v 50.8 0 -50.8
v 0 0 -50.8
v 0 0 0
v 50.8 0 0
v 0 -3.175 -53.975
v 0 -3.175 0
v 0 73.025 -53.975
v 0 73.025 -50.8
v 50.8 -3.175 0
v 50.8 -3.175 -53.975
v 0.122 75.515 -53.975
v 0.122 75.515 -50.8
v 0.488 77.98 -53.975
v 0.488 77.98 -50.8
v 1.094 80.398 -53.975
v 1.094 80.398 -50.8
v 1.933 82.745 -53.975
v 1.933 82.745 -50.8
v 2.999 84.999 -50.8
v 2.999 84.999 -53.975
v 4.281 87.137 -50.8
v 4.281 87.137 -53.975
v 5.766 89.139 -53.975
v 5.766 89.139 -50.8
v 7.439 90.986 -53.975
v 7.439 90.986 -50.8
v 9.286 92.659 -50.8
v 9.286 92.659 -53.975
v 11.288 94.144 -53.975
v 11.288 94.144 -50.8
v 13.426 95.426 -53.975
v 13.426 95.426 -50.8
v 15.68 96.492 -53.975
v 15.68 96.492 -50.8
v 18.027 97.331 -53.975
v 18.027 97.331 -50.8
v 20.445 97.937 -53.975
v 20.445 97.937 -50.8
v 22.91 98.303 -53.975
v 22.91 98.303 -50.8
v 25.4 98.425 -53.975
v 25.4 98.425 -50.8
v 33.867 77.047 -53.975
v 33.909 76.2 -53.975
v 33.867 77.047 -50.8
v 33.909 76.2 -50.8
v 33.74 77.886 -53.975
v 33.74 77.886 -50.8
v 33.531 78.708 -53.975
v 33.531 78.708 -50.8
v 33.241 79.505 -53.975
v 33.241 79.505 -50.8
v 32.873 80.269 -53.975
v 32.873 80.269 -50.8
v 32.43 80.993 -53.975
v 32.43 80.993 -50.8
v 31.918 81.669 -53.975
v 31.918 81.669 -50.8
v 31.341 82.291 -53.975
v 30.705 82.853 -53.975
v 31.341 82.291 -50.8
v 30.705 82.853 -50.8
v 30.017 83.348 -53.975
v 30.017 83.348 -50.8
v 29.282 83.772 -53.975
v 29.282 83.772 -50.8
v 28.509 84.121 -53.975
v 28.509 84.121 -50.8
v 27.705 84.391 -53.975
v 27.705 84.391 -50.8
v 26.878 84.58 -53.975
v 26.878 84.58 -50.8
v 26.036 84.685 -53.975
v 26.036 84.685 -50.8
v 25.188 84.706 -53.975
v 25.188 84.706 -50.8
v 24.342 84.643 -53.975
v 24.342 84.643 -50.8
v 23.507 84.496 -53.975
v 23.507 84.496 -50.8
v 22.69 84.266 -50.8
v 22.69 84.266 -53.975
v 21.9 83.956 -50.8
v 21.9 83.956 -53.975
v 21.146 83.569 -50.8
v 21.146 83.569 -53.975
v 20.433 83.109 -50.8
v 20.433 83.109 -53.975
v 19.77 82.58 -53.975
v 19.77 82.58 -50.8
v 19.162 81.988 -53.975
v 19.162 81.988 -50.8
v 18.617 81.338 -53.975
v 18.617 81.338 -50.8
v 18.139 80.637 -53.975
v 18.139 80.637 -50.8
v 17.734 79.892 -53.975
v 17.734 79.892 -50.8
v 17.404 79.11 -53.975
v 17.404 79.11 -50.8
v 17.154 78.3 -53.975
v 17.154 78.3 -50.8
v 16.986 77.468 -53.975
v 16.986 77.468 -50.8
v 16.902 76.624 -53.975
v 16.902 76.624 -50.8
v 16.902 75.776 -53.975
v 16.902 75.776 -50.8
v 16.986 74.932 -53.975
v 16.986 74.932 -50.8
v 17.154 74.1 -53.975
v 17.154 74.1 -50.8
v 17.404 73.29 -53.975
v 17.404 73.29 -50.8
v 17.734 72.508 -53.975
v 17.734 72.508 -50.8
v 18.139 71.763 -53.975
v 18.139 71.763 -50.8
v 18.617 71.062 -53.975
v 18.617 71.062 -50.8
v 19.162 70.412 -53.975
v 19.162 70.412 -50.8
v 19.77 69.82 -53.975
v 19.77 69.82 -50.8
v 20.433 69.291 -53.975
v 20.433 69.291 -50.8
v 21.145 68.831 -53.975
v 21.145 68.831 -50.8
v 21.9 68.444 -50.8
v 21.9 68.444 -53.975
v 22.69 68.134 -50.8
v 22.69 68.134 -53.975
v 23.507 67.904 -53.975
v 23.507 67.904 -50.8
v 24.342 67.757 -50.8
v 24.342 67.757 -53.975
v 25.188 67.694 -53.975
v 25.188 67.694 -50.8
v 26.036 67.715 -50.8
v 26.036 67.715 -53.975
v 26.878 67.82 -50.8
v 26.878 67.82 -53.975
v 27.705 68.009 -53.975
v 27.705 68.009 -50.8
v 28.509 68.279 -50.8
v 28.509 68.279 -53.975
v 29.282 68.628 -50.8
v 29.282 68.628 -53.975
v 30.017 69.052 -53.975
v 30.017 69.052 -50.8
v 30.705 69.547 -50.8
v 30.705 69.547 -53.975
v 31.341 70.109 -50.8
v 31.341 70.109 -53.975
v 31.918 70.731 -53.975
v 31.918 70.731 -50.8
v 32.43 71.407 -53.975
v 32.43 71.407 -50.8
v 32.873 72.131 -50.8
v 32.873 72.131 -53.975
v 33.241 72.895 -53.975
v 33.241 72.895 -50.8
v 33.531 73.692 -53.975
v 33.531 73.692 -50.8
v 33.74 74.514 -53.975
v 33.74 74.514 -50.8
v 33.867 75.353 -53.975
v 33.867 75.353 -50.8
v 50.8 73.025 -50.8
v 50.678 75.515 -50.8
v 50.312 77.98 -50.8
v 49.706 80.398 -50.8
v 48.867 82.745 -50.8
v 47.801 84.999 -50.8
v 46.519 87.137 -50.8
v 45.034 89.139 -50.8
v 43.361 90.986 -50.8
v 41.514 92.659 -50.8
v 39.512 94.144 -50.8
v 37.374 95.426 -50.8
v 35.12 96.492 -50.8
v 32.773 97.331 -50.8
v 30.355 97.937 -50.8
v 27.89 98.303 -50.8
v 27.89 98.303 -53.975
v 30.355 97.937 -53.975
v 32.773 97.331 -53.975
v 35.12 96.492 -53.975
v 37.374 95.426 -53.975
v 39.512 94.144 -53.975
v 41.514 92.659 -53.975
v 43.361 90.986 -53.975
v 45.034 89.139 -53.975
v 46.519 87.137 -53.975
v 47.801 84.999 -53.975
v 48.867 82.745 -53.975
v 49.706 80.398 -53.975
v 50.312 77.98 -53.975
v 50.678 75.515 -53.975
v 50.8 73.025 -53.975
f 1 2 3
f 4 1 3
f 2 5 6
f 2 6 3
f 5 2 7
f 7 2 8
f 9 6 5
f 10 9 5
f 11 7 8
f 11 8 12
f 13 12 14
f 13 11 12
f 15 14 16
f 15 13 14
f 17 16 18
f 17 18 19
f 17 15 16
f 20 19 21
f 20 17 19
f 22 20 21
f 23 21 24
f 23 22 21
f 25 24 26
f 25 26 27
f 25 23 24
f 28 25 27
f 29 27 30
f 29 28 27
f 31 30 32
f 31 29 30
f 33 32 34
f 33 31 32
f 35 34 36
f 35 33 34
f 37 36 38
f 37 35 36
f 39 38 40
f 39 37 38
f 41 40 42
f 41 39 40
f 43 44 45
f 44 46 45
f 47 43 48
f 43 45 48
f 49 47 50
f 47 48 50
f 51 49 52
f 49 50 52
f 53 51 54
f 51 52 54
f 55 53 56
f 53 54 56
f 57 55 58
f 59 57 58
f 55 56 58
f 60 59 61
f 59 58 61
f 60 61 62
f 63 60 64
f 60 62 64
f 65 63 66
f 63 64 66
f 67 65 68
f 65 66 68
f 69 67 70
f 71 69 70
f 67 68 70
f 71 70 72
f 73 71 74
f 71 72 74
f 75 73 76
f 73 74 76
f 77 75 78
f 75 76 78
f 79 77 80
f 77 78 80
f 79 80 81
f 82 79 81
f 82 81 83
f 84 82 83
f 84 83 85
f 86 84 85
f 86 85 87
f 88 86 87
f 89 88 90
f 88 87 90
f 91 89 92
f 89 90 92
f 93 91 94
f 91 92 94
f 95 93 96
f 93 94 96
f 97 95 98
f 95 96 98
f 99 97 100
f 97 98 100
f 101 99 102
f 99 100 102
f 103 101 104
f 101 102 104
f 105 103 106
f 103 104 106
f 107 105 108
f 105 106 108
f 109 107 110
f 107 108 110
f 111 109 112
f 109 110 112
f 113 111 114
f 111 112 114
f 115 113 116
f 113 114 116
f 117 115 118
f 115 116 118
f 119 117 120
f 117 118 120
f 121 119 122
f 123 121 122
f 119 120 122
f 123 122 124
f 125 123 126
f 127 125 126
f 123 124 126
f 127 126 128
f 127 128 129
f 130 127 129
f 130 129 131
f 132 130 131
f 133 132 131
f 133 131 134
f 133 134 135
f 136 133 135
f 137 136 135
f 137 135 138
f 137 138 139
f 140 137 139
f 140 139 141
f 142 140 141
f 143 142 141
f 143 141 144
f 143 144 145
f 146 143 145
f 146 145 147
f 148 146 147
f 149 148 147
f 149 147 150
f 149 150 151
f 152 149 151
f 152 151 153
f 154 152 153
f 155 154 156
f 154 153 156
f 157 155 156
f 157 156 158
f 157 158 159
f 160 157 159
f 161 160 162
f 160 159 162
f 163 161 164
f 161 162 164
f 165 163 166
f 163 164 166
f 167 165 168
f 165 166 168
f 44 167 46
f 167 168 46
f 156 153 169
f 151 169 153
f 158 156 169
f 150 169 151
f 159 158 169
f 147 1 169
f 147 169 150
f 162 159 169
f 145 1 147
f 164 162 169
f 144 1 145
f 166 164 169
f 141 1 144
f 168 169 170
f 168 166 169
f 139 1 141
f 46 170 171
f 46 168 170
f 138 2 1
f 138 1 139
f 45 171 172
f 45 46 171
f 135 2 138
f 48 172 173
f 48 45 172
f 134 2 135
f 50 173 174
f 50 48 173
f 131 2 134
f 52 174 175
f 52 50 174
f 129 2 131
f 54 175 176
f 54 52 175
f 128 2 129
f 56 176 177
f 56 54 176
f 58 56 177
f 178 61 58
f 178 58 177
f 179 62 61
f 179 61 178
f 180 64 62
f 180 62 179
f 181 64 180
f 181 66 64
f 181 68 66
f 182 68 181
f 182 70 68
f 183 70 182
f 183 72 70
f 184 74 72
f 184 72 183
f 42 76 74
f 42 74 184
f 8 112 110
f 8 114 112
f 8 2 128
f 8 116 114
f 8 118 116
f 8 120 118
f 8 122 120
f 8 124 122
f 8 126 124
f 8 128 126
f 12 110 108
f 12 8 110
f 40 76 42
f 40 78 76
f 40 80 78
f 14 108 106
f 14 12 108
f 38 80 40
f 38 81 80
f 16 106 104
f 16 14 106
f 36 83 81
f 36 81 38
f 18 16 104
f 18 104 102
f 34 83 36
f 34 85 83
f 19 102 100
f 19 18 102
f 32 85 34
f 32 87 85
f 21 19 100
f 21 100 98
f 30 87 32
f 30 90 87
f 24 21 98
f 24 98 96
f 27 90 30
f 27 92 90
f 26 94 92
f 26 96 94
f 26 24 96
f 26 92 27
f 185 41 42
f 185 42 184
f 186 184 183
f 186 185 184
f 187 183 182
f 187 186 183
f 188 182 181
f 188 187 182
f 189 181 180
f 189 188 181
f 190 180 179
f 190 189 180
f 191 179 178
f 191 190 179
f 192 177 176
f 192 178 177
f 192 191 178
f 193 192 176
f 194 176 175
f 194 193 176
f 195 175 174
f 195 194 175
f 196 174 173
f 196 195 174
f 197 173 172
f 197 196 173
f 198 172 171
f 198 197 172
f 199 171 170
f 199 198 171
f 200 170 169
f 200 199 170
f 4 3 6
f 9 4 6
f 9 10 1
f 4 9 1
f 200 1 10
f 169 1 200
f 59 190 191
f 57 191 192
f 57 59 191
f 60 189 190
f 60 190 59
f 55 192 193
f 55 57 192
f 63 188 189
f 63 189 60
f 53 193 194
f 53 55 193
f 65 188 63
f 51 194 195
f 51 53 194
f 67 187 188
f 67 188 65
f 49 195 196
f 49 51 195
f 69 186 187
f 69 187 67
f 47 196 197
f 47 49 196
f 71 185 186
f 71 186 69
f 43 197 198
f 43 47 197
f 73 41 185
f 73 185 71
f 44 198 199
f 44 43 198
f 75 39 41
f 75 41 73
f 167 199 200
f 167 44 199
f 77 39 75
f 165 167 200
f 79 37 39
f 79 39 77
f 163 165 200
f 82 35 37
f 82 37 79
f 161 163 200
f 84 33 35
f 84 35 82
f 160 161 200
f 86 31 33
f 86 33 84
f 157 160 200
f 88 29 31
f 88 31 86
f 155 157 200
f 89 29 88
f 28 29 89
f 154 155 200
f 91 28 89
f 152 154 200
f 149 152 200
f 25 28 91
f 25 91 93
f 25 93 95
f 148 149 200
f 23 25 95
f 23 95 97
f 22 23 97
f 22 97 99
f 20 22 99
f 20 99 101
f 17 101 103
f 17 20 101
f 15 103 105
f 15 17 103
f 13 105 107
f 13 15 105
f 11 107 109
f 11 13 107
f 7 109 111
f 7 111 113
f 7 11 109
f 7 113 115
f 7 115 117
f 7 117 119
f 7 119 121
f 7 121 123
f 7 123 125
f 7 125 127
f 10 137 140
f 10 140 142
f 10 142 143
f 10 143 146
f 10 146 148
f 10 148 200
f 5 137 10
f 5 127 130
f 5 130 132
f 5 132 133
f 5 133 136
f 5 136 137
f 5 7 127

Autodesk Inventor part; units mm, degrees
ref_plane "YZ Plane" through (0, 0, 0) normal (1, 0, 0) x (0, 1, 0)
ref_plane "XZ Plane" through (0, 0, 0) normal (0, 1, 0) x (-1, 0, 0)
ref_plane "XY Plane" through (0, 0, 0) normal (0, 0, 1) x (1, 0, 0)
sketch "Sketch1" plane through (0, 0, 0) normal (1, 0, 0) x (0, 1, 0)
  line L0 (0, 0) -> (-3.175, 0)
  line L1 (-3.175, 0) -> (-3.175, -50.8)
  line L2 (-3.175, -50.8) -> (0, -50.8)
  line L3 (0, -50.8) -> (0, 0)
  line L4 (-3.175, -50.8) -> (98.425, -50.8)
  line L5 (98.425, -50.8) -> (98.425, -53.975)
  line L6 (98.425, -53.975) -> (-3.175, -53.975)
  line L7 (-3.175, -53.975) -> (-3.175, -50.8)
  dimension "d0" = 3.175
  dimension "d1" = 50.8
  dimension "d2" = 101.6
  dimension "d3" = 3.175
extrude "Extrusion1" add sketch "Sketch1" along normal blind 50.8
sketch "Sketch2" plane through (0, 0, -50.8) normal (0, 0, 1) x (1, 0, 0)
  circle A0 centre (25.4, 76.2) radius 8.509
  line L0 (0, 98.425) -> (0, 0) projected
  line L1 (0, 0) -> (50.8, 0) projected
  dimension "d6" = 17.018
  dimension "d7" = 25.4
  dimension "d8" = 76.2
extrude "Extrusion2" cut sketch "Sketch2" against normal through all
fillet "Fillet1" radius 25.4 2 edges at (50.8, 98.425, -52.3875) (0, 98.425, -52.3875)
properties part number "L Connector Ramp" material "Aluminum 6061"
